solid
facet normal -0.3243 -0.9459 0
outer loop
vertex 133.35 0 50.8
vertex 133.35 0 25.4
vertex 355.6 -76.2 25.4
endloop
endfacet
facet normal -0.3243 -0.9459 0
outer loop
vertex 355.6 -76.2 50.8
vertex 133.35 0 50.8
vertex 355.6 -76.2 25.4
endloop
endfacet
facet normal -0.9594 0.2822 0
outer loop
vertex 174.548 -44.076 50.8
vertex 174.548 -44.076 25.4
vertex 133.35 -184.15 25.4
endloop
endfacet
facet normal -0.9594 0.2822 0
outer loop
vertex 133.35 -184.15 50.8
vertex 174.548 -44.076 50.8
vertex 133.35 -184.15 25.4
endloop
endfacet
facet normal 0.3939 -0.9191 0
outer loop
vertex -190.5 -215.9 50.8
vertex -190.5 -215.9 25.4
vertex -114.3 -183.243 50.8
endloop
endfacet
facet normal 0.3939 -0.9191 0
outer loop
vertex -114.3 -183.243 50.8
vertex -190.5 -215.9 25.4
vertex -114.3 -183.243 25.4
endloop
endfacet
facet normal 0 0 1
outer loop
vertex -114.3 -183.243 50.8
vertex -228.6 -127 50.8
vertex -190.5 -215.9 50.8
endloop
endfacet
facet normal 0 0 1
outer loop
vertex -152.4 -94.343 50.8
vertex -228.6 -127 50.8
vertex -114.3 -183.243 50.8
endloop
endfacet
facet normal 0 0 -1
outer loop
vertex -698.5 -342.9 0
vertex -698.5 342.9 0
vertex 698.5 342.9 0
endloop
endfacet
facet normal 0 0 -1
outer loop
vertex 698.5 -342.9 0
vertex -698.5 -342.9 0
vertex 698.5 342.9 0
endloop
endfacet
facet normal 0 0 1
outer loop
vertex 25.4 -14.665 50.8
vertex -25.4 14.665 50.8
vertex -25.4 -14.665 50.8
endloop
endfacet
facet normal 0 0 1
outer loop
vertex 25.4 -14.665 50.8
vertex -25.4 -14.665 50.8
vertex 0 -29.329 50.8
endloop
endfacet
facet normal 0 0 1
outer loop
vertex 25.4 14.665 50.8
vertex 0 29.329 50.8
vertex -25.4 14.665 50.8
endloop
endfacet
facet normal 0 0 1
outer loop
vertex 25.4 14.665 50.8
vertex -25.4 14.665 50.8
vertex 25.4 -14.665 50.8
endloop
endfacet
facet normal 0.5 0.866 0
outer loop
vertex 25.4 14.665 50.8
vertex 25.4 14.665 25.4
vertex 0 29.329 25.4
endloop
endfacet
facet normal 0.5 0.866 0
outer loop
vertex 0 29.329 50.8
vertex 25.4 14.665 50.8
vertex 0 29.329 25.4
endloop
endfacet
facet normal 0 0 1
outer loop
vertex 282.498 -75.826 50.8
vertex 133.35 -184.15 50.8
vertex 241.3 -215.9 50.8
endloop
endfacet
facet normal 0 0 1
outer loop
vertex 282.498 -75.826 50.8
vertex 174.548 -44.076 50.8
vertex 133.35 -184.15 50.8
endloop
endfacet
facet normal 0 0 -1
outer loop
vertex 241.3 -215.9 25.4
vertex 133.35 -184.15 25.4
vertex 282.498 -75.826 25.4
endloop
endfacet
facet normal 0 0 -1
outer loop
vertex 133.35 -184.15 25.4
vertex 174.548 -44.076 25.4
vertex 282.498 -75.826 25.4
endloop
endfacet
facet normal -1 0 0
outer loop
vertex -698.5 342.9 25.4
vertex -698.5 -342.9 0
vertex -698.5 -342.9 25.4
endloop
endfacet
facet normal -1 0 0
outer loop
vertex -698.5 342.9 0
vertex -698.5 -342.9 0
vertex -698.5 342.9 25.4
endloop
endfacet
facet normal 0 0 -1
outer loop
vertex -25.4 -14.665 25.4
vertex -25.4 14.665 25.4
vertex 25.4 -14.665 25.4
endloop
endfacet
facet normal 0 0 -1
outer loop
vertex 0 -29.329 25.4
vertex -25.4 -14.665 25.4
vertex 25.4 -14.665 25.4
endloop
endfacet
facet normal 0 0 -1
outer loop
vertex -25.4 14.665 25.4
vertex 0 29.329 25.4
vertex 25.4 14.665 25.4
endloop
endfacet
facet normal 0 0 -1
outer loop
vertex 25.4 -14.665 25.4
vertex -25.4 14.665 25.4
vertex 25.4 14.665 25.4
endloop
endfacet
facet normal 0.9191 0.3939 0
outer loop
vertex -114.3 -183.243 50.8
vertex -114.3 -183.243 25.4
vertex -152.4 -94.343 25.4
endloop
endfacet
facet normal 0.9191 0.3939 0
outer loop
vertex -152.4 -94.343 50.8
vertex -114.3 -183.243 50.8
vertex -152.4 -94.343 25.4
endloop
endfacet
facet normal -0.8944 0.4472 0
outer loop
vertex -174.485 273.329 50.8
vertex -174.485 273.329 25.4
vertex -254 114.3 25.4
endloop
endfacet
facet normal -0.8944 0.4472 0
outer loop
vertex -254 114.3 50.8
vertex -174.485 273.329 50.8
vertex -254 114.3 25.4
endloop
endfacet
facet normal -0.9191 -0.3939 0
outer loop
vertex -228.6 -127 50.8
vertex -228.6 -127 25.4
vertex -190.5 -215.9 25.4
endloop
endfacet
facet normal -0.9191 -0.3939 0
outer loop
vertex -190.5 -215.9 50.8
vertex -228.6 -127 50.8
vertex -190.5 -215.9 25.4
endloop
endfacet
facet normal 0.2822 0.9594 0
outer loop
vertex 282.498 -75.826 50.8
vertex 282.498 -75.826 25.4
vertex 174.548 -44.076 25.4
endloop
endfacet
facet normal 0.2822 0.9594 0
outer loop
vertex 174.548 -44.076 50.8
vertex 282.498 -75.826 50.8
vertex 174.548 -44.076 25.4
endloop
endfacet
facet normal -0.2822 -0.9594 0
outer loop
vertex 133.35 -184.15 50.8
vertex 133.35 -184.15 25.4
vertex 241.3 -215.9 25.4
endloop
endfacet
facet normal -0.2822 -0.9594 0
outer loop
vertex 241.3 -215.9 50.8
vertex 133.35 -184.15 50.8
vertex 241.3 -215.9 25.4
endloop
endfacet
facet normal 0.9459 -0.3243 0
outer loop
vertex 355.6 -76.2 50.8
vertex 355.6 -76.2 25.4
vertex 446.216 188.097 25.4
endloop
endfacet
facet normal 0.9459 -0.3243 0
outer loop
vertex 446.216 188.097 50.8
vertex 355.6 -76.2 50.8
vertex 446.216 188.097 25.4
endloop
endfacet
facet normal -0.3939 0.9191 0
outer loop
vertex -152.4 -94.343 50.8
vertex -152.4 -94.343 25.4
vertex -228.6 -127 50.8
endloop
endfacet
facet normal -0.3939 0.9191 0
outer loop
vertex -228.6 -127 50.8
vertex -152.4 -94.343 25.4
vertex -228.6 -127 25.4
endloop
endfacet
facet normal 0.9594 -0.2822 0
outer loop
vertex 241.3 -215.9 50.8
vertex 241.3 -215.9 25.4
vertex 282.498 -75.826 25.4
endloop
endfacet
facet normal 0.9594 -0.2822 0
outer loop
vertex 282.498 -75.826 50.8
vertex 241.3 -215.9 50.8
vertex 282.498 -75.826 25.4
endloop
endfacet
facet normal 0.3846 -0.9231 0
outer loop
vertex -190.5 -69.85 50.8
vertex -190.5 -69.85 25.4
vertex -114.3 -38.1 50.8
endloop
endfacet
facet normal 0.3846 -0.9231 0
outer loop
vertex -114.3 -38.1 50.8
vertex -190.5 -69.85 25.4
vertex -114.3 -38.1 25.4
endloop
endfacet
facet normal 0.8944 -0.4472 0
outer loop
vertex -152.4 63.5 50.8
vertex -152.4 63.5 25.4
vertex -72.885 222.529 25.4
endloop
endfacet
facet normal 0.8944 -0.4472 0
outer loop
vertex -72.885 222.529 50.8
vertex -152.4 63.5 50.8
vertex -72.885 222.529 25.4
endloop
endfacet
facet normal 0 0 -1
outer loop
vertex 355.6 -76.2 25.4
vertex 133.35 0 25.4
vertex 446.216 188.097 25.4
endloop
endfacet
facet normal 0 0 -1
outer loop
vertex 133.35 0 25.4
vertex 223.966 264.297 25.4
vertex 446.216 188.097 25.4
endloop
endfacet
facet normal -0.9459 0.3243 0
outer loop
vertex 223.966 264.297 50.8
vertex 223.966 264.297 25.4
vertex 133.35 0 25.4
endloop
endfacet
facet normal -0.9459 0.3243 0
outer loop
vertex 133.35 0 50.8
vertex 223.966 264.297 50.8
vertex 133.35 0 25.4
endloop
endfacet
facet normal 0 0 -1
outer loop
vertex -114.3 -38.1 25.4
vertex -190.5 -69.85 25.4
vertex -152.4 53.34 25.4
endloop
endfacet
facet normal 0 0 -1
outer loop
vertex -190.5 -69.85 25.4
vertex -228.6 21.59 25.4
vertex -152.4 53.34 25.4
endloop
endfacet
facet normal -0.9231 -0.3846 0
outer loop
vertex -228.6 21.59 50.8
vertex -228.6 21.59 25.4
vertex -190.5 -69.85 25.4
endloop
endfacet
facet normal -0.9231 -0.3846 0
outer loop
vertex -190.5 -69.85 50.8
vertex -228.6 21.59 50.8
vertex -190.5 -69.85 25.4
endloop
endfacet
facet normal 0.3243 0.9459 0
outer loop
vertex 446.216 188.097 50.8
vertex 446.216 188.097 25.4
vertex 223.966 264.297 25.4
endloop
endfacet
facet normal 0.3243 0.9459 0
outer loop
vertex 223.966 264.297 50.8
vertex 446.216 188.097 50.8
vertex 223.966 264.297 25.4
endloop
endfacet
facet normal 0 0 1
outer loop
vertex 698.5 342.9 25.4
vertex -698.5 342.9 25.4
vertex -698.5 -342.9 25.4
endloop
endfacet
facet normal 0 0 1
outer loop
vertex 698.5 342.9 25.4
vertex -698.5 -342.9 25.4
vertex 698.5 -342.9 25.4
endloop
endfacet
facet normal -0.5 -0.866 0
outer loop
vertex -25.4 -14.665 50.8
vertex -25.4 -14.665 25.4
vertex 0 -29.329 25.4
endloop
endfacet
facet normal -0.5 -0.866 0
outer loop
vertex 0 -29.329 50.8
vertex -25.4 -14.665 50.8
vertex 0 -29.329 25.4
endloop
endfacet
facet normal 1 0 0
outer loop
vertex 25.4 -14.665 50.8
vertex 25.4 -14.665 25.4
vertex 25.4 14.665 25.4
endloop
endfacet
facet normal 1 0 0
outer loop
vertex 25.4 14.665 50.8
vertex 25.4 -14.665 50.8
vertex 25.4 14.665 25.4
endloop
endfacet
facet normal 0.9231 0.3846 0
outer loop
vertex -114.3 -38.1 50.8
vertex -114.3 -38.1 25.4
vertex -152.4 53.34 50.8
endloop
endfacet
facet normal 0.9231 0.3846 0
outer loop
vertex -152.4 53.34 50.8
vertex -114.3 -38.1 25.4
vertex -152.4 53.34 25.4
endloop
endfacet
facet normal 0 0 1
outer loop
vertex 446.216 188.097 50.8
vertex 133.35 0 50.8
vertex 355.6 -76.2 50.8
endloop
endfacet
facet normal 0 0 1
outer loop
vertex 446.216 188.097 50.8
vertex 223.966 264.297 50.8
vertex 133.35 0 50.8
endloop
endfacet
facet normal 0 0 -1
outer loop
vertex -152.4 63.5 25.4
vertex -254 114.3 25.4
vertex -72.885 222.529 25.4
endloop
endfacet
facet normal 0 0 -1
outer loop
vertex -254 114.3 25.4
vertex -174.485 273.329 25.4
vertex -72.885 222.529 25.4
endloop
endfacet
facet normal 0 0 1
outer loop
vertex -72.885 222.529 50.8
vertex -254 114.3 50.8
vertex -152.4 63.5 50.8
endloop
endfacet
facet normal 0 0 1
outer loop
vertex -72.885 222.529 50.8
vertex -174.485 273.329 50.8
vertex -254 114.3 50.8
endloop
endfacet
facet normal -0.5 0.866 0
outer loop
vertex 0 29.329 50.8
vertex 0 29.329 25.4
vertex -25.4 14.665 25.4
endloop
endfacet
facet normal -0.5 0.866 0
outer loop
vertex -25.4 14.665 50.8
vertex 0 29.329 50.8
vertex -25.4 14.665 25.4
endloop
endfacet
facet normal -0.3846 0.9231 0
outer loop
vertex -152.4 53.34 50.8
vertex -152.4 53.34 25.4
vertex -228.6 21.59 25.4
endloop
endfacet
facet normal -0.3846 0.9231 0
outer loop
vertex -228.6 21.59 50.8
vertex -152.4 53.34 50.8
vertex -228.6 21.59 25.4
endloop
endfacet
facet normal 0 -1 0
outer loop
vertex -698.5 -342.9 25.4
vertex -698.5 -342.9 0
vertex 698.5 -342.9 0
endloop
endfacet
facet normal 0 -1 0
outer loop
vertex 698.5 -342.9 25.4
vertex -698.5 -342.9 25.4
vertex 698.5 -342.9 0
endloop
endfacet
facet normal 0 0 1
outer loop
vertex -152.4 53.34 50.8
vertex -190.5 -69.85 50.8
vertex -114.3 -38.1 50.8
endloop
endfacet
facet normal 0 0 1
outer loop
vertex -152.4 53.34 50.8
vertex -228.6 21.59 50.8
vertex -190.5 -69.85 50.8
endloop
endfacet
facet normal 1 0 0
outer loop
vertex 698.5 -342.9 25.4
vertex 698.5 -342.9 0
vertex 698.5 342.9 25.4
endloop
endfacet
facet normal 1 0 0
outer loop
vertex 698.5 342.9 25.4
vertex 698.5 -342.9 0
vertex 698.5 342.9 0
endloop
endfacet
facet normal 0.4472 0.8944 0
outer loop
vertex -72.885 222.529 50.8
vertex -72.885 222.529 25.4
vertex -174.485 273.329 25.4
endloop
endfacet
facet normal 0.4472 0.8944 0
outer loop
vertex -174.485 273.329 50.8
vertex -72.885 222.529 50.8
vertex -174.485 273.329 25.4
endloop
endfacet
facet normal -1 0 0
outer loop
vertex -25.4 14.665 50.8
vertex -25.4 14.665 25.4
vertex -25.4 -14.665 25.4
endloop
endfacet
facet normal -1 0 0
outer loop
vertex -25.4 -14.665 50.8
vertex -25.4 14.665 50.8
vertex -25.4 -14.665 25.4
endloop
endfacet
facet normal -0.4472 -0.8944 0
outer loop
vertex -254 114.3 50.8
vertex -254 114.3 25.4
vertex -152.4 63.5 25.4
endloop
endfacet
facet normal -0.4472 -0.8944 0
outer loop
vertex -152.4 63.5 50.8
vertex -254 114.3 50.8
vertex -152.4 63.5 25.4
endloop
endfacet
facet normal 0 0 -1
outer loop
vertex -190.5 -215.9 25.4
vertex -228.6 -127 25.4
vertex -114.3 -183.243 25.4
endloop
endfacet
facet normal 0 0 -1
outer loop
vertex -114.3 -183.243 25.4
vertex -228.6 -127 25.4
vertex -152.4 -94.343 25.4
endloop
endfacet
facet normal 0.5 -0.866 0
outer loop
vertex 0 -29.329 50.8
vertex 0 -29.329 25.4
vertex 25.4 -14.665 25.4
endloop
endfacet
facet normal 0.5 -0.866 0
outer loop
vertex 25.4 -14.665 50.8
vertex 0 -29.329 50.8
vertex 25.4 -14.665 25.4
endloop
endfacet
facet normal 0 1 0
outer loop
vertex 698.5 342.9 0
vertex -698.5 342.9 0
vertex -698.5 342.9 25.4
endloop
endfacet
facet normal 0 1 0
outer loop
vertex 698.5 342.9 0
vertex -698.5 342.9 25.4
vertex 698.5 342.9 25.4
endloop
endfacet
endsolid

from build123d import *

# Parameters (mm, degrees)
F0_W     = 1397
F0_H     = 685.8
F1_DEPTH = 25.4
F3_DEPTH = 25.4


with BuildPart() as f1:
    # F0 (on Top) → F1 (new body)
    with BuildSketch(Plane.XY):
        Rectangle(F0_W, F0_H)
    extrude(amount=F1_DEPTH)


with BuildPart() as f3:
    # F2 (on face) → F3 (new body)
    with BuildSketch(Plane.XY.offset(25.4)):
        Polygon((25.4, -14.664697), (25.4, 14.664697), (0, 29.329394), (-25.4, 14.664697), (-25.4, -14.664697), (0, -29.329394), align=None)
        Polygon((-190.5, -215.9), (-114.3, -183.242857), (-152.4, -94.342857), (-228.6, -127), align=None)
        Polygon((-190.5, -69.85), (-114.3, -38.1), (-152.4, 53.34), (-228.6, 21.59), align=None)
        Polygon((-254, 114.3), (-152.4, 63.5), (-72.885423, 222.529155), (-174.485423, 273.329155), align=None)
        Polygon((133.35, 0), (355.6, -76.2), (446.216216, 188.097297), (223.966216, 264.297297), align=None)
        Polygon((133.35, -184.15), (241.3, -215.9), (282.498271, -75.825878), (174.548271, -44.075878), align=None)
    extrude(amount=F3_DEPTH)


solid = Compound([f1.part, f3.part])
